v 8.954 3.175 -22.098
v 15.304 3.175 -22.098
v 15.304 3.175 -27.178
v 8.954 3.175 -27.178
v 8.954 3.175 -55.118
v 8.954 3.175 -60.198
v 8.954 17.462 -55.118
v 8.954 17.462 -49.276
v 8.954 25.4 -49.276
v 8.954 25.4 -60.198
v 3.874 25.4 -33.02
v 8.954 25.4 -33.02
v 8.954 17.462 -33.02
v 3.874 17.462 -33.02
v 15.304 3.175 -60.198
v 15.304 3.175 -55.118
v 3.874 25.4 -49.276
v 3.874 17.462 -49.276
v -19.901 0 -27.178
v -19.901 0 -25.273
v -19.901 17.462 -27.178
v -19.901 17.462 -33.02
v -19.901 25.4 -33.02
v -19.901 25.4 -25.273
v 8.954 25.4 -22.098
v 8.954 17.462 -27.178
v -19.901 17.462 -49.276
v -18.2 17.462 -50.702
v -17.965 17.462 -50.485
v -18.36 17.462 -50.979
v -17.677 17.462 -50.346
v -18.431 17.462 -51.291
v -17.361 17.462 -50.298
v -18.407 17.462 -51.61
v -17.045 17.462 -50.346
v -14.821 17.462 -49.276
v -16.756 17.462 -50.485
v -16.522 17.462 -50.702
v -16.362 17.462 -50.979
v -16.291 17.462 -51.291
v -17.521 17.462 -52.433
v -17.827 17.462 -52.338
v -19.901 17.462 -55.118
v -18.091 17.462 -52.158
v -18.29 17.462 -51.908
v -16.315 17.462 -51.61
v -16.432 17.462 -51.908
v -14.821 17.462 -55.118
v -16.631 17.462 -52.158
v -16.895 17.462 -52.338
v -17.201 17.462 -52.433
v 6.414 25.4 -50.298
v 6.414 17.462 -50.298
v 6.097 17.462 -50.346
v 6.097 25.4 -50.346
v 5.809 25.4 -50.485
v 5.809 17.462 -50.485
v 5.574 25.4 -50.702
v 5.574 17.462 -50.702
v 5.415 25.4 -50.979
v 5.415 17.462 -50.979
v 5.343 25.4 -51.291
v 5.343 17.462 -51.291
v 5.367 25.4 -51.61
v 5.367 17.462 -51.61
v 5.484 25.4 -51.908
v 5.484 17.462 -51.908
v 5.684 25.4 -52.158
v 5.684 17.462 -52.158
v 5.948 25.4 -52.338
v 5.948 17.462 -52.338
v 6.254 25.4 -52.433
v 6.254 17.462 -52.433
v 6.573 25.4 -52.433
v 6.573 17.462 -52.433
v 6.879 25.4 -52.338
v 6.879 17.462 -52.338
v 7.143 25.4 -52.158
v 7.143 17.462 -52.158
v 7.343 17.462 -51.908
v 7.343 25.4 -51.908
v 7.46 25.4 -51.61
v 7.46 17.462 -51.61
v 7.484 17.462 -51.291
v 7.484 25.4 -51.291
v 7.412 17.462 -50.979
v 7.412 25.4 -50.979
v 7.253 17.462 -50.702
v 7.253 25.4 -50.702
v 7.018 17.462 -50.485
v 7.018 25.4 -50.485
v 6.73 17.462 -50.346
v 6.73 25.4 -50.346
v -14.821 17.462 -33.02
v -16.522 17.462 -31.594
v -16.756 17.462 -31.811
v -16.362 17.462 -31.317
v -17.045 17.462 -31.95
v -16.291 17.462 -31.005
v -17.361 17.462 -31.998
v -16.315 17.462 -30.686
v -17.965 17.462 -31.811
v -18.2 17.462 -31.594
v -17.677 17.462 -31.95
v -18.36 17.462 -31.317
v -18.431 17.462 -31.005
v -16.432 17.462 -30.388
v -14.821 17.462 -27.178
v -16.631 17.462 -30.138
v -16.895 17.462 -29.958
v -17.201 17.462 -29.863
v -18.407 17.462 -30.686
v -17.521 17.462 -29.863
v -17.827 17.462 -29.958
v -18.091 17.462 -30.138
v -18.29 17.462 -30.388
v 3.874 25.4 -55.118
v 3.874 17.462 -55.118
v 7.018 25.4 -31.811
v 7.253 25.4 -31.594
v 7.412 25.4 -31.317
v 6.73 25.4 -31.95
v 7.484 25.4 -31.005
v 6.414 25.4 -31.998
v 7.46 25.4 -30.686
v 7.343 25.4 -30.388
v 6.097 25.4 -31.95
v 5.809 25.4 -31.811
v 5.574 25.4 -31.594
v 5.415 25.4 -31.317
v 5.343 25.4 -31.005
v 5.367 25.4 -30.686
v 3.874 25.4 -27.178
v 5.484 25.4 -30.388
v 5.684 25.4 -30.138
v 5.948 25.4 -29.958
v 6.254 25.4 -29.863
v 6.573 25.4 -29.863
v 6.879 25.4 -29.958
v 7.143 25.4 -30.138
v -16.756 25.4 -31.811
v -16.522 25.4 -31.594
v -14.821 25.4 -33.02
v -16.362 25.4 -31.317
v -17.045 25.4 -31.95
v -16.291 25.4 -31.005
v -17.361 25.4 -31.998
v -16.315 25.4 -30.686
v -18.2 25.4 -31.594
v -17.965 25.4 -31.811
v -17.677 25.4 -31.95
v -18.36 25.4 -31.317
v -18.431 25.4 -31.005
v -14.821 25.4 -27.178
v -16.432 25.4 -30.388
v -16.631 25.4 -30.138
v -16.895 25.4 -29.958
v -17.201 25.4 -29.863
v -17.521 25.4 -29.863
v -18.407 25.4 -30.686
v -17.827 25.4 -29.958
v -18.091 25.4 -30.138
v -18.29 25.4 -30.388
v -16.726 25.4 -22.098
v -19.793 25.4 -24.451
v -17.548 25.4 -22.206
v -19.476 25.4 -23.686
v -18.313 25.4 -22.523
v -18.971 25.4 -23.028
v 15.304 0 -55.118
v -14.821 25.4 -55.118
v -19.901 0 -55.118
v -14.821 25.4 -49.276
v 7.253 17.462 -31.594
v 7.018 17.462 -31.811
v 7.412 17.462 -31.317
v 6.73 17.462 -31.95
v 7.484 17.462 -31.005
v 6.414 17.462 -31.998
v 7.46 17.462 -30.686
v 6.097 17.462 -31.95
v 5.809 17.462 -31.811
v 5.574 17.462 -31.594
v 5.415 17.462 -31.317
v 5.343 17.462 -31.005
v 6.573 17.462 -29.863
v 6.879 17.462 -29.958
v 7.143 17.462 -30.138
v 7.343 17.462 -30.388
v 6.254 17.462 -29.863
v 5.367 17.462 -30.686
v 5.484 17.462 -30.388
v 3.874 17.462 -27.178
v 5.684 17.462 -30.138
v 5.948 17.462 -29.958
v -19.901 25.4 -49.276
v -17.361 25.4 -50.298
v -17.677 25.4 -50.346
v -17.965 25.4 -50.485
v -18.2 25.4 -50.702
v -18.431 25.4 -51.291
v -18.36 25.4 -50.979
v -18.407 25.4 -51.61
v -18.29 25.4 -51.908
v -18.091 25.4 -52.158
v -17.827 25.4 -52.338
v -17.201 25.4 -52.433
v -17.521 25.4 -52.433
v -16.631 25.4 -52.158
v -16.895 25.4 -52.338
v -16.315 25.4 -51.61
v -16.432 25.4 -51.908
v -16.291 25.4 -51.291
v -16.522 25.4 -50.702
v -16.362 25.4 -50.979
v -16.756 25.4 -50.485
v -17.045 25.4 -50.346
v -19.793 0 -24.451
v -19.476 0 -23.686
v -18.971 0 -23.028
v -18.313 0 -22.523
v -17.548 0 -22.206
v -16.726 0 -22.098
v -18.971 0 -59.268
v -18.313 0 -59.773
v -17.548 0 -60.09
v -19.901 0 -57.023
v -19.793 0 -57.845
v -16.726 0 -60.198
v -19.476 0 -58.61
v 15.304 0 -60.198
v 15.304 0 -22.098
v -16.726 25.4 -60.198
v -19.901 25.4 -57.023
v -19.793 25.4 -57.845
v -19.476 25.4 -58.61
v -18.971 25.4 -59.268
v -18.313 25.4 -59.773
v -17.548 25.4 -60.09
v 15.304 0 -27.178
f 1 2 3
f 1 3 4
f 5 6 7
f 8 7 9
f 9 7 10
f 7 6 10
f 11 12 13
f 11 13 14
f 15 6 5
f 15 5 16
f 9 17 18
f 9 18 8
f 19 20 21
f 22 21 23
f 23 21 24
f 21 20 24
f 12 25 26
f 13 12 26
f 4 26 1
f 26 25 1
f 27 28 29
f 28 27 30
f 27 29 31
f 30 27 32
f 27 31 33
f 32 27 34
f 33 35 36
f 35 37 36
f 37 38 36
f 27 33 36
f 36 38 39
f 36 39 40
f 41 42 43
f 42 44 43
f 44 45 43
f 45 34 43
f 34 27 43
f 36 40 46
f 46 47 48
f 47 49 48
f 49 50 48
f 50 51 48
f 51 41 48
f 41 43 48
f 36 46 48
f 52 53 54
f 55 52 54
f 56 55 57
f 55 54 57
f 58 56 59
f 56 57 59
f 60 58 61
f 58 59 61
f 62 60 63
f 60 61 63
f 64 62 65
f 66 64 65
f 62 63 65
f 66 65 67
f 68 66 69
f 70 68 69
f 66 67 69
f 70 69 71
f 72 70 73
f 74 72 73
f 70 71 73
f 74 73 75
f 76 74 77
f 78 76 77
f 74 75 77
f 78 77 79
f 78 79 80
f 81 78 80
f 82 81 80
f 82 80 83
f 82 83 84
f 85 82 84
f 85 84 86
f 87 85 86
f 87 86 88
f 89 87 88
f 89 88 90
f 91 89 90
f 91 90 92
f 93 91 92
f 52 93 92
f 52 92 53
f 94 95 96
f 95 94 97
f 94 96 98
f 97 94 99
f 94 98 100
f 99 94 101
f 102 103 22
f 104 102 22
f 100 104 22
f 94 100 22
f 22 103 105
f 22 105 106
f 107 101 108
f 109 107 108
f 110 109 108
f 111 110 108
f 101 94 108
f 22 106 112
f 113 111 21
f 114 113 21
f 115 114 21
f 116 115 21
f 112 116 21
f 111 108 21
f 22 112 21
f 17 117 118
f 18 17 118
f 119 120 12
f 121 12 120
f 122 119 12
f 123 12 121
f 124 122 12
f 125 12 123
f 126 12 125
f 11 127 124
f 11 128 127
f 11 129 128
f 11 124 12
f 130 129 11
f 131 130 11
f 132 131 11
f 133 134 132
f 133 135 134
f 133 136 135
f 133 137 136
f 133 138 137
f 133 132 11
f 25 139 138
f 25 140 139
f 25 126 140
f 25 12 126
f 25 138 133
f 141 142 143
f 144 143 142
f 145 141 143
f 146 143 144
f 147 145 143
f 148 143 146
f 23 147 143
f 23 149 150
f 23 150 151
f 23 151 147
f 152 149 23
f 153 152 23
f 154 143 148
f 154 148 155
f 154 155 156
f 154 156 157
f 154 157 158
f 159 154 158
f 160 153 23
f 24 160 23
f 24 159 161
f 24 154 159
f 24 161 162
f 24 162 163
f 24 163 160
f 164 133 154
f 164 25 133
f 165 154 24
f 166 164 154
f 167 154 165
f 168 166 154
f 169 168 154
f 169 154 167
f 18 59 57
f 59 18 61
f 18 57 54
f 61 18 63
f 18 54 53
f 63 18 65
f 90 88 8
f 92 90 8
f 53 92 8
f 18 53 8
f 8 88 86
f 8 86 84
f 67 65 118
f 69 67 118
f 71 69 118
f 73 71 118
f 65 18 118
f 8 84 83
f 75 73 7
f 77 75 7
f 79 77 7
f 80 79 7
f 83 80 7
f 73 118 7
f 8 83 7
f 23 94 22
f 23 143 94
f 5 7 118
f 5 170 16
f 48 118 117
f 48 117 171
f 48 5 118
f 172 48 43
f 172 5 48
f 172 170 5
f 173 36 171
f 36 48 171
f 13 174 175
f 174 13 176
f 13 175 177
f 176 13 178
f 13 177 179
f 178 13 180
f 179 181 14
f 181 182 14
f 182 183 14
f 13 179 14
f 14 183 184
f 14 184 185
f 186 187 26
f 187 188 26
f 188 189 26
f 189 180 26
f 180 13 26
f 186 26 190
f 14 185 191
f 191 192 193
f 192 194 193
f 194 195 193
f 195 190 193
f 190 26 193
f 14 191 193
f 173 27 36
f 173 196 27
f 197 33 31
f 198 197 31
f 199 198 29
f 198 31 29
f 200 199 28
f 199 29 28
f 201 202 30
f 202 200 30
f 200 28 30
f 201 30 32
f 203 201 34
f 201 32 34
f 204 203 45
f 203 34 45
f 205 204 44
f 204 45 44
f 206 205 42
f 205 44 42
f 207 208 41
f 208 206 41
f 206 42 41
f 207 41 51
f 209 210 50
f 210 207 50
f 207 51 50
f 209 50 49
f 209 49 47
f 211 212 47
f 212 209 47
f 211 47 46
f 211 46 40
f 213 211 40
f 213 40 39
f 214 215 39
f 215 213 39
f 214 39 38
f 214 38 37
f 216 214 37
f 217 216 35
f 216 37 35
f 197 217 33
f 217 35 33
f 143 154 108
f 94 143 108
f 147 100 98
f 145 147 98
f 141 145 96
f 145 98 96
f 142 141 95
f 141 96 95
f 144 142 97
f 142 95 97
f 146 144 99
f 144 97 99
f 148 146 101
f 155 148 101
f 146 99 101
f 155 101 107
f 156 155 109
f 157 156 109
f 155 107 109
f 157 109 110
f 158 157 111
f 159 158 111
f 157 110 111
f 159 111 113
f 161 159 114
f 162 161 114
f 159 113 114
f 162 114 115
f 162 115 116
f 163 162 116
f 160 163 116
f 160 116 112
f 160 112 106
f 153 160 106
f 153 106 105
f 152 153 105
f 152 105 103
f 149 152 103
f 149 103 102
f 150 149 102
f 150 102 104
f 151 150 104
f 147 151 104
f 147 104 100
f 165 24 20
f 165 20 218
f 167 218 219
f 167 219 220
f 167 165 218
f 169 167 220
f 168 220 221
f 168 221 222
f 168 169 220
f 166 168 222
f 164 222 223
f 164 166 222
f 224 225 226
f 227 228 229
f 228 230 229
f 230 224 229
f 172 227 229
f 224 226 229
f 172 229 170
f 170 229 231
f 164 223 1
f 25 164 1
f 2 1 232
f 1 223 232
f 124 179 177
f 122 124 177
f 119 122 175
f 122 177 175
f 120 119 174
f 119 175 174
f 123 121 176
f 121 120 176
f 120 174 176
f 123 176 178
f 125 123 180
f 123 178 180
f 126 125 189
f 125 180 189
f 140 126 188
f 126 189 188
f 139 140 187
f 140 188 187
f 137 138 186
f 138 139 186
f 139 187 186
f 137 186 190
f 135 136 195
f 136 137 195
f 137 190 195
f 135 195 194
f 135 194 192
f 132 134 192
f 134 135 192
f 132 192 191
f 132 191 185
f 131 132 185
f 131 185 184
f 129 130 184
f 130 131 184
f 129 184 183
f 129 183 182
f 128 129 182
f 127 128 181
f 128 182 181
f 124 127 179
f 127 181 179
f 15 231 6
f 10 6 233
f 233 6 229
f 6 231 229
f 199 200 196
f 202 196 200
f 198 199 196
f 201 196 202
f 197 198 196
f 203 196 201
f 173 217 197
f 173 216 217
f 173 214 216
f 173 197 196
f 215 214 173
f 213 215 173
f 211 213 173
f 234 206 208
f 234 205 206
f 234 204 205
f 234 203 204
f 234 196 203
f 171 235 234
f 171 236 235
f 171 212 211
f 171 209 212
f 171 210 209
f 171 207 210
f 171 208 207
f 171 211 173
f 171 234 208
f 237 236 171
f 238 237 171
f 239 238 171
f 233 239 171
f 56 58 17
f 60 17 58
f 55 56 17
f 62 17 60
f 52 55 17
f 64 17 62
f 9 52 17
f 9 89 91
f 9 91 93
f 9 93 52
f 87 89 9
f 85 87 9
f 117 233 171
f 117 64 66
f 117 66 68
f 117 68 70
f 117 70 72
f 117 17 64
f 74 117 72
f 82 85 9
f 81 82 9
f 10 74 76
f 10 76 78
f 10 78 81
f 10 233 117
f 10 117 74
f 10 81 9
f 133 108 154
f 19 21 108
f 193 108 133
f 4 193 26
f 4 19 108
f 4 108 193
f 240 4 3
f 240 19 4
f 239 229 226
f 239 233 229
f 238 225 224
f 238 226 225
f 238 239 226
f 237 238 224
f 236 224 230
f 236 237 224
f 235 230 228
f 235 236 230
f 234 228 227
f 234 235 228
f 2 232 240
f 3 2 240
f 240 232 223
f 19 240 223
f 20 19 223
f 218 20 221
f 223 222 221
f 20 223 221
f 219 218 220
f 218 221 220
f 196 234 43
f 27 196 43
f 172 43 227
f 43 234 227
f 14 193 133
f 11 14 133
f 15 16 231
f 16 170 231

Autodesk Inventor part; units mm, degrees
ref_plane "YZ Plane" through (0, 0, 0) normal (1, 0, 0) x (0, 1, 0)
ref_plane "XZ Plane" through (0, 0, 0) normal (0, 1, 0) x (-1, 0, 0)
sketch "Sketch1" plane through (0, 0, 0) normal (0, 1, 0) x (-1, 0, 0)
  line L0 (0, 0) -> (-8.9535, 0)
  line L1 (-8.9535, 0) -> (-8.9535, -82.296)
  line L2 (-8.9535, -82.296) -> (0, -82.296)
  line L3 (0, -82.296) -> (0, 0)
  line L4 (0, -41.148) -> (-8.9535, -41.148) construction
  line L5 (0, -22.098) -> (19.9009, -22.098)
  line L6 (19.9009, -22.098) -> (19.9009, -60.198)
  line L7 (19.9009, -60.198) -> (0, -60.198)
  line L8 (0, -60.198) -> (0, -22.098)
  line L9 (19.9009, -55.118) -> (0, -55.118)
  line L10 (0, -55.118) -> (0, -27.178)
  line L11 (0, -27.178) -> (19.9009, -27.178)
  line L12 (19.9009, -27.178) -> (19.9009, -55.118)
  line L13 (0, -55.118) -> (8.9662, -55.118)
  line L14 (8.9662, -55.118) -> (8.9662, -27.178)
  line L15 (8.9662, -27.178) -> (0, -27.178)
  line L16 (0, -27.178) -> (0, -55.118)
  line L17 (0, -27.178) -> (-8.9535, -27.178)
  line L18 (0, -55.118) -> (-8.9535, -55.118)
  line L19 (0, -22.098) -> (-8.9535, -22.098)
  line L20 (0, -60.198) -> (-8.9535, -60.198)
  line L21 (-8.9535, -27.178) -> (-21.6535, -27.178)
  line L22 (-21.6535, -27.178) -> (-21.6535, -14.478)
  line L23 (-21.6535, -14.478) -> (-15.3035, -14.478)
  line L24 (-8.9535, -13.6415) -> (-8.9535, -27.178)
  line L25 (-8.9535, -55.118) -> (-16.891, -55.118)
  line L26 (-16.891, -67.818) -> (-8.9535, -67.818)
  line L27 (-8.9535, -67.818) -> (-8.9535, -55.118)
  line L28 (-8.9535, -22.098) -> (-15.3035, -22.098)
  line L29 (-15.3035, -22.098) -> (-15.3035, -14.478)
  line L30 (-15.3035, -22.098) -> (-15.3035, -27.178)
  point P0 (-4.4768, 0)
  point P1 (0, -60.198)
  point P2 (0, -55.118)
  point P3 (19.9009, -27.178)
  point P4 (0, -55.118)
  point P5 (0, -60.198)
  point P6 (-8.9535, -67.818)
  point P7 (-8.9535, -13.6415)
  dimension "d0" = 82.296
  dimension "d1" = 8.9535
  dimension "d5" = 38.1
  dimension "d6" = 19.9009
  dimension "d11" = 27.94
  dimension "d28" = 8.9662
  dimension "d46" = 7.9375
  dimension "d48" = 12.7
  dimension "d50" = 12.7
  dimension "d51" = 6.35
  dimension "d52" = 6.35
extrude "Extrusion1" add sketch "Sketch1" along normal blind 3.175 contours L1 L21 L30 L28
extrude "Extrusion2" add sketch "Sketch1" along normal blind 25.4 contours L5 L6 L11 L3 | L3 L17 L1 L19 | L9 L6 L7 L3 | L3 L20 L1 L18
sketch "Sketch2" plane through (-19.9009, 0, -55.118) normal (0, 0, 1) x (1, 0, 0)
  line L0 (23.7744, 25.4) -> (23.7744, 17.4625)
  line L1 (23.7744, 17.4625) -> (28.8544, 17.4625)
  line L2 (28.8544, 17.4625) -> (28.8544, 25.4)
  line L3 (28.8544, 0) -> (28.8544, 25.4) projected
  line L4 (23.7744, 25.4) -> (28.8544, 25.4)
  line L5 (28.8544, 25.4) -> (28.8544, 17.4625)
  line L6 (19.9009, 0) -> (19.9009, 0) projected
  line L7 (0, 25.4) -> (28.8544, 25.4) projected
  point P0 (28.8544, 3.175)
  point P1 (36.7919, 0)
  dimension "d40" = 7.9375
  dimension "d41" = 5.08
  dimension "d44" = 7.9375
extrude "Extrusion3" add sketch "Sketch2" along normal blind 5.842
sketch "Sketch3" plane through (0, 25.4, 0) normal (0, 1, 0) x (1, 0, 0)
  line L0 (-19.9009, 55.118) -> (8.9535, 55.118) construction
  line L1 (3.8735, 49.276) -> (8.9535, 49.276) construction
  line L2 (6.4135, 49.276) -> (6.4135, 55.118) construction
  line L3 (-19.9009, 55.118) -> (8.9535, 55.118) construction
  point P0 (0, 0)
  point P1 (0, 55.118)
  point P2 (6.4135, 51.3715)
  point P3 (-8.9662, 55.118)
  point P4 (16.891, 55.118)
  dimension "d34" = 2.0955
  dimension "d35" = 0
hole "Hole1" at (6.4135, 25.4, -51.3715) direction (0, -1, 0) diameter 2.1463 depth 7.9375
ref_plane "Work Plane4" through (-19.9009, 0, -41.148) normal (0, 0, 1) x (1, 0, 0)
mirror "Mirror3" about plane through (-19.9009, 0, -41.148) normal (0, 0, 1) of "Hole1", "Extrusion3"
fillet "Fillet11" radius 3.175 2 edges at (-19.9009, 12.7, -22.098) (-19.9009, 12.7, -60.198)
ref_plane "Work Plane5" through (-5.4737, 3.175, -22.098) normal (1, 0, 0) x (0, 0, -1)
mirror "Mirror5" about plane through (-5.4737, 3.175, -22.098) normal (1, 0, 0) of "Hole1", "Extrusion3", "Mirror3"
mirror "Mirror6" about plane through (-19.9009, 0, -41.148) normal (0, 0, 1) of "Extrusion1"
properties part number "lepton mount"
